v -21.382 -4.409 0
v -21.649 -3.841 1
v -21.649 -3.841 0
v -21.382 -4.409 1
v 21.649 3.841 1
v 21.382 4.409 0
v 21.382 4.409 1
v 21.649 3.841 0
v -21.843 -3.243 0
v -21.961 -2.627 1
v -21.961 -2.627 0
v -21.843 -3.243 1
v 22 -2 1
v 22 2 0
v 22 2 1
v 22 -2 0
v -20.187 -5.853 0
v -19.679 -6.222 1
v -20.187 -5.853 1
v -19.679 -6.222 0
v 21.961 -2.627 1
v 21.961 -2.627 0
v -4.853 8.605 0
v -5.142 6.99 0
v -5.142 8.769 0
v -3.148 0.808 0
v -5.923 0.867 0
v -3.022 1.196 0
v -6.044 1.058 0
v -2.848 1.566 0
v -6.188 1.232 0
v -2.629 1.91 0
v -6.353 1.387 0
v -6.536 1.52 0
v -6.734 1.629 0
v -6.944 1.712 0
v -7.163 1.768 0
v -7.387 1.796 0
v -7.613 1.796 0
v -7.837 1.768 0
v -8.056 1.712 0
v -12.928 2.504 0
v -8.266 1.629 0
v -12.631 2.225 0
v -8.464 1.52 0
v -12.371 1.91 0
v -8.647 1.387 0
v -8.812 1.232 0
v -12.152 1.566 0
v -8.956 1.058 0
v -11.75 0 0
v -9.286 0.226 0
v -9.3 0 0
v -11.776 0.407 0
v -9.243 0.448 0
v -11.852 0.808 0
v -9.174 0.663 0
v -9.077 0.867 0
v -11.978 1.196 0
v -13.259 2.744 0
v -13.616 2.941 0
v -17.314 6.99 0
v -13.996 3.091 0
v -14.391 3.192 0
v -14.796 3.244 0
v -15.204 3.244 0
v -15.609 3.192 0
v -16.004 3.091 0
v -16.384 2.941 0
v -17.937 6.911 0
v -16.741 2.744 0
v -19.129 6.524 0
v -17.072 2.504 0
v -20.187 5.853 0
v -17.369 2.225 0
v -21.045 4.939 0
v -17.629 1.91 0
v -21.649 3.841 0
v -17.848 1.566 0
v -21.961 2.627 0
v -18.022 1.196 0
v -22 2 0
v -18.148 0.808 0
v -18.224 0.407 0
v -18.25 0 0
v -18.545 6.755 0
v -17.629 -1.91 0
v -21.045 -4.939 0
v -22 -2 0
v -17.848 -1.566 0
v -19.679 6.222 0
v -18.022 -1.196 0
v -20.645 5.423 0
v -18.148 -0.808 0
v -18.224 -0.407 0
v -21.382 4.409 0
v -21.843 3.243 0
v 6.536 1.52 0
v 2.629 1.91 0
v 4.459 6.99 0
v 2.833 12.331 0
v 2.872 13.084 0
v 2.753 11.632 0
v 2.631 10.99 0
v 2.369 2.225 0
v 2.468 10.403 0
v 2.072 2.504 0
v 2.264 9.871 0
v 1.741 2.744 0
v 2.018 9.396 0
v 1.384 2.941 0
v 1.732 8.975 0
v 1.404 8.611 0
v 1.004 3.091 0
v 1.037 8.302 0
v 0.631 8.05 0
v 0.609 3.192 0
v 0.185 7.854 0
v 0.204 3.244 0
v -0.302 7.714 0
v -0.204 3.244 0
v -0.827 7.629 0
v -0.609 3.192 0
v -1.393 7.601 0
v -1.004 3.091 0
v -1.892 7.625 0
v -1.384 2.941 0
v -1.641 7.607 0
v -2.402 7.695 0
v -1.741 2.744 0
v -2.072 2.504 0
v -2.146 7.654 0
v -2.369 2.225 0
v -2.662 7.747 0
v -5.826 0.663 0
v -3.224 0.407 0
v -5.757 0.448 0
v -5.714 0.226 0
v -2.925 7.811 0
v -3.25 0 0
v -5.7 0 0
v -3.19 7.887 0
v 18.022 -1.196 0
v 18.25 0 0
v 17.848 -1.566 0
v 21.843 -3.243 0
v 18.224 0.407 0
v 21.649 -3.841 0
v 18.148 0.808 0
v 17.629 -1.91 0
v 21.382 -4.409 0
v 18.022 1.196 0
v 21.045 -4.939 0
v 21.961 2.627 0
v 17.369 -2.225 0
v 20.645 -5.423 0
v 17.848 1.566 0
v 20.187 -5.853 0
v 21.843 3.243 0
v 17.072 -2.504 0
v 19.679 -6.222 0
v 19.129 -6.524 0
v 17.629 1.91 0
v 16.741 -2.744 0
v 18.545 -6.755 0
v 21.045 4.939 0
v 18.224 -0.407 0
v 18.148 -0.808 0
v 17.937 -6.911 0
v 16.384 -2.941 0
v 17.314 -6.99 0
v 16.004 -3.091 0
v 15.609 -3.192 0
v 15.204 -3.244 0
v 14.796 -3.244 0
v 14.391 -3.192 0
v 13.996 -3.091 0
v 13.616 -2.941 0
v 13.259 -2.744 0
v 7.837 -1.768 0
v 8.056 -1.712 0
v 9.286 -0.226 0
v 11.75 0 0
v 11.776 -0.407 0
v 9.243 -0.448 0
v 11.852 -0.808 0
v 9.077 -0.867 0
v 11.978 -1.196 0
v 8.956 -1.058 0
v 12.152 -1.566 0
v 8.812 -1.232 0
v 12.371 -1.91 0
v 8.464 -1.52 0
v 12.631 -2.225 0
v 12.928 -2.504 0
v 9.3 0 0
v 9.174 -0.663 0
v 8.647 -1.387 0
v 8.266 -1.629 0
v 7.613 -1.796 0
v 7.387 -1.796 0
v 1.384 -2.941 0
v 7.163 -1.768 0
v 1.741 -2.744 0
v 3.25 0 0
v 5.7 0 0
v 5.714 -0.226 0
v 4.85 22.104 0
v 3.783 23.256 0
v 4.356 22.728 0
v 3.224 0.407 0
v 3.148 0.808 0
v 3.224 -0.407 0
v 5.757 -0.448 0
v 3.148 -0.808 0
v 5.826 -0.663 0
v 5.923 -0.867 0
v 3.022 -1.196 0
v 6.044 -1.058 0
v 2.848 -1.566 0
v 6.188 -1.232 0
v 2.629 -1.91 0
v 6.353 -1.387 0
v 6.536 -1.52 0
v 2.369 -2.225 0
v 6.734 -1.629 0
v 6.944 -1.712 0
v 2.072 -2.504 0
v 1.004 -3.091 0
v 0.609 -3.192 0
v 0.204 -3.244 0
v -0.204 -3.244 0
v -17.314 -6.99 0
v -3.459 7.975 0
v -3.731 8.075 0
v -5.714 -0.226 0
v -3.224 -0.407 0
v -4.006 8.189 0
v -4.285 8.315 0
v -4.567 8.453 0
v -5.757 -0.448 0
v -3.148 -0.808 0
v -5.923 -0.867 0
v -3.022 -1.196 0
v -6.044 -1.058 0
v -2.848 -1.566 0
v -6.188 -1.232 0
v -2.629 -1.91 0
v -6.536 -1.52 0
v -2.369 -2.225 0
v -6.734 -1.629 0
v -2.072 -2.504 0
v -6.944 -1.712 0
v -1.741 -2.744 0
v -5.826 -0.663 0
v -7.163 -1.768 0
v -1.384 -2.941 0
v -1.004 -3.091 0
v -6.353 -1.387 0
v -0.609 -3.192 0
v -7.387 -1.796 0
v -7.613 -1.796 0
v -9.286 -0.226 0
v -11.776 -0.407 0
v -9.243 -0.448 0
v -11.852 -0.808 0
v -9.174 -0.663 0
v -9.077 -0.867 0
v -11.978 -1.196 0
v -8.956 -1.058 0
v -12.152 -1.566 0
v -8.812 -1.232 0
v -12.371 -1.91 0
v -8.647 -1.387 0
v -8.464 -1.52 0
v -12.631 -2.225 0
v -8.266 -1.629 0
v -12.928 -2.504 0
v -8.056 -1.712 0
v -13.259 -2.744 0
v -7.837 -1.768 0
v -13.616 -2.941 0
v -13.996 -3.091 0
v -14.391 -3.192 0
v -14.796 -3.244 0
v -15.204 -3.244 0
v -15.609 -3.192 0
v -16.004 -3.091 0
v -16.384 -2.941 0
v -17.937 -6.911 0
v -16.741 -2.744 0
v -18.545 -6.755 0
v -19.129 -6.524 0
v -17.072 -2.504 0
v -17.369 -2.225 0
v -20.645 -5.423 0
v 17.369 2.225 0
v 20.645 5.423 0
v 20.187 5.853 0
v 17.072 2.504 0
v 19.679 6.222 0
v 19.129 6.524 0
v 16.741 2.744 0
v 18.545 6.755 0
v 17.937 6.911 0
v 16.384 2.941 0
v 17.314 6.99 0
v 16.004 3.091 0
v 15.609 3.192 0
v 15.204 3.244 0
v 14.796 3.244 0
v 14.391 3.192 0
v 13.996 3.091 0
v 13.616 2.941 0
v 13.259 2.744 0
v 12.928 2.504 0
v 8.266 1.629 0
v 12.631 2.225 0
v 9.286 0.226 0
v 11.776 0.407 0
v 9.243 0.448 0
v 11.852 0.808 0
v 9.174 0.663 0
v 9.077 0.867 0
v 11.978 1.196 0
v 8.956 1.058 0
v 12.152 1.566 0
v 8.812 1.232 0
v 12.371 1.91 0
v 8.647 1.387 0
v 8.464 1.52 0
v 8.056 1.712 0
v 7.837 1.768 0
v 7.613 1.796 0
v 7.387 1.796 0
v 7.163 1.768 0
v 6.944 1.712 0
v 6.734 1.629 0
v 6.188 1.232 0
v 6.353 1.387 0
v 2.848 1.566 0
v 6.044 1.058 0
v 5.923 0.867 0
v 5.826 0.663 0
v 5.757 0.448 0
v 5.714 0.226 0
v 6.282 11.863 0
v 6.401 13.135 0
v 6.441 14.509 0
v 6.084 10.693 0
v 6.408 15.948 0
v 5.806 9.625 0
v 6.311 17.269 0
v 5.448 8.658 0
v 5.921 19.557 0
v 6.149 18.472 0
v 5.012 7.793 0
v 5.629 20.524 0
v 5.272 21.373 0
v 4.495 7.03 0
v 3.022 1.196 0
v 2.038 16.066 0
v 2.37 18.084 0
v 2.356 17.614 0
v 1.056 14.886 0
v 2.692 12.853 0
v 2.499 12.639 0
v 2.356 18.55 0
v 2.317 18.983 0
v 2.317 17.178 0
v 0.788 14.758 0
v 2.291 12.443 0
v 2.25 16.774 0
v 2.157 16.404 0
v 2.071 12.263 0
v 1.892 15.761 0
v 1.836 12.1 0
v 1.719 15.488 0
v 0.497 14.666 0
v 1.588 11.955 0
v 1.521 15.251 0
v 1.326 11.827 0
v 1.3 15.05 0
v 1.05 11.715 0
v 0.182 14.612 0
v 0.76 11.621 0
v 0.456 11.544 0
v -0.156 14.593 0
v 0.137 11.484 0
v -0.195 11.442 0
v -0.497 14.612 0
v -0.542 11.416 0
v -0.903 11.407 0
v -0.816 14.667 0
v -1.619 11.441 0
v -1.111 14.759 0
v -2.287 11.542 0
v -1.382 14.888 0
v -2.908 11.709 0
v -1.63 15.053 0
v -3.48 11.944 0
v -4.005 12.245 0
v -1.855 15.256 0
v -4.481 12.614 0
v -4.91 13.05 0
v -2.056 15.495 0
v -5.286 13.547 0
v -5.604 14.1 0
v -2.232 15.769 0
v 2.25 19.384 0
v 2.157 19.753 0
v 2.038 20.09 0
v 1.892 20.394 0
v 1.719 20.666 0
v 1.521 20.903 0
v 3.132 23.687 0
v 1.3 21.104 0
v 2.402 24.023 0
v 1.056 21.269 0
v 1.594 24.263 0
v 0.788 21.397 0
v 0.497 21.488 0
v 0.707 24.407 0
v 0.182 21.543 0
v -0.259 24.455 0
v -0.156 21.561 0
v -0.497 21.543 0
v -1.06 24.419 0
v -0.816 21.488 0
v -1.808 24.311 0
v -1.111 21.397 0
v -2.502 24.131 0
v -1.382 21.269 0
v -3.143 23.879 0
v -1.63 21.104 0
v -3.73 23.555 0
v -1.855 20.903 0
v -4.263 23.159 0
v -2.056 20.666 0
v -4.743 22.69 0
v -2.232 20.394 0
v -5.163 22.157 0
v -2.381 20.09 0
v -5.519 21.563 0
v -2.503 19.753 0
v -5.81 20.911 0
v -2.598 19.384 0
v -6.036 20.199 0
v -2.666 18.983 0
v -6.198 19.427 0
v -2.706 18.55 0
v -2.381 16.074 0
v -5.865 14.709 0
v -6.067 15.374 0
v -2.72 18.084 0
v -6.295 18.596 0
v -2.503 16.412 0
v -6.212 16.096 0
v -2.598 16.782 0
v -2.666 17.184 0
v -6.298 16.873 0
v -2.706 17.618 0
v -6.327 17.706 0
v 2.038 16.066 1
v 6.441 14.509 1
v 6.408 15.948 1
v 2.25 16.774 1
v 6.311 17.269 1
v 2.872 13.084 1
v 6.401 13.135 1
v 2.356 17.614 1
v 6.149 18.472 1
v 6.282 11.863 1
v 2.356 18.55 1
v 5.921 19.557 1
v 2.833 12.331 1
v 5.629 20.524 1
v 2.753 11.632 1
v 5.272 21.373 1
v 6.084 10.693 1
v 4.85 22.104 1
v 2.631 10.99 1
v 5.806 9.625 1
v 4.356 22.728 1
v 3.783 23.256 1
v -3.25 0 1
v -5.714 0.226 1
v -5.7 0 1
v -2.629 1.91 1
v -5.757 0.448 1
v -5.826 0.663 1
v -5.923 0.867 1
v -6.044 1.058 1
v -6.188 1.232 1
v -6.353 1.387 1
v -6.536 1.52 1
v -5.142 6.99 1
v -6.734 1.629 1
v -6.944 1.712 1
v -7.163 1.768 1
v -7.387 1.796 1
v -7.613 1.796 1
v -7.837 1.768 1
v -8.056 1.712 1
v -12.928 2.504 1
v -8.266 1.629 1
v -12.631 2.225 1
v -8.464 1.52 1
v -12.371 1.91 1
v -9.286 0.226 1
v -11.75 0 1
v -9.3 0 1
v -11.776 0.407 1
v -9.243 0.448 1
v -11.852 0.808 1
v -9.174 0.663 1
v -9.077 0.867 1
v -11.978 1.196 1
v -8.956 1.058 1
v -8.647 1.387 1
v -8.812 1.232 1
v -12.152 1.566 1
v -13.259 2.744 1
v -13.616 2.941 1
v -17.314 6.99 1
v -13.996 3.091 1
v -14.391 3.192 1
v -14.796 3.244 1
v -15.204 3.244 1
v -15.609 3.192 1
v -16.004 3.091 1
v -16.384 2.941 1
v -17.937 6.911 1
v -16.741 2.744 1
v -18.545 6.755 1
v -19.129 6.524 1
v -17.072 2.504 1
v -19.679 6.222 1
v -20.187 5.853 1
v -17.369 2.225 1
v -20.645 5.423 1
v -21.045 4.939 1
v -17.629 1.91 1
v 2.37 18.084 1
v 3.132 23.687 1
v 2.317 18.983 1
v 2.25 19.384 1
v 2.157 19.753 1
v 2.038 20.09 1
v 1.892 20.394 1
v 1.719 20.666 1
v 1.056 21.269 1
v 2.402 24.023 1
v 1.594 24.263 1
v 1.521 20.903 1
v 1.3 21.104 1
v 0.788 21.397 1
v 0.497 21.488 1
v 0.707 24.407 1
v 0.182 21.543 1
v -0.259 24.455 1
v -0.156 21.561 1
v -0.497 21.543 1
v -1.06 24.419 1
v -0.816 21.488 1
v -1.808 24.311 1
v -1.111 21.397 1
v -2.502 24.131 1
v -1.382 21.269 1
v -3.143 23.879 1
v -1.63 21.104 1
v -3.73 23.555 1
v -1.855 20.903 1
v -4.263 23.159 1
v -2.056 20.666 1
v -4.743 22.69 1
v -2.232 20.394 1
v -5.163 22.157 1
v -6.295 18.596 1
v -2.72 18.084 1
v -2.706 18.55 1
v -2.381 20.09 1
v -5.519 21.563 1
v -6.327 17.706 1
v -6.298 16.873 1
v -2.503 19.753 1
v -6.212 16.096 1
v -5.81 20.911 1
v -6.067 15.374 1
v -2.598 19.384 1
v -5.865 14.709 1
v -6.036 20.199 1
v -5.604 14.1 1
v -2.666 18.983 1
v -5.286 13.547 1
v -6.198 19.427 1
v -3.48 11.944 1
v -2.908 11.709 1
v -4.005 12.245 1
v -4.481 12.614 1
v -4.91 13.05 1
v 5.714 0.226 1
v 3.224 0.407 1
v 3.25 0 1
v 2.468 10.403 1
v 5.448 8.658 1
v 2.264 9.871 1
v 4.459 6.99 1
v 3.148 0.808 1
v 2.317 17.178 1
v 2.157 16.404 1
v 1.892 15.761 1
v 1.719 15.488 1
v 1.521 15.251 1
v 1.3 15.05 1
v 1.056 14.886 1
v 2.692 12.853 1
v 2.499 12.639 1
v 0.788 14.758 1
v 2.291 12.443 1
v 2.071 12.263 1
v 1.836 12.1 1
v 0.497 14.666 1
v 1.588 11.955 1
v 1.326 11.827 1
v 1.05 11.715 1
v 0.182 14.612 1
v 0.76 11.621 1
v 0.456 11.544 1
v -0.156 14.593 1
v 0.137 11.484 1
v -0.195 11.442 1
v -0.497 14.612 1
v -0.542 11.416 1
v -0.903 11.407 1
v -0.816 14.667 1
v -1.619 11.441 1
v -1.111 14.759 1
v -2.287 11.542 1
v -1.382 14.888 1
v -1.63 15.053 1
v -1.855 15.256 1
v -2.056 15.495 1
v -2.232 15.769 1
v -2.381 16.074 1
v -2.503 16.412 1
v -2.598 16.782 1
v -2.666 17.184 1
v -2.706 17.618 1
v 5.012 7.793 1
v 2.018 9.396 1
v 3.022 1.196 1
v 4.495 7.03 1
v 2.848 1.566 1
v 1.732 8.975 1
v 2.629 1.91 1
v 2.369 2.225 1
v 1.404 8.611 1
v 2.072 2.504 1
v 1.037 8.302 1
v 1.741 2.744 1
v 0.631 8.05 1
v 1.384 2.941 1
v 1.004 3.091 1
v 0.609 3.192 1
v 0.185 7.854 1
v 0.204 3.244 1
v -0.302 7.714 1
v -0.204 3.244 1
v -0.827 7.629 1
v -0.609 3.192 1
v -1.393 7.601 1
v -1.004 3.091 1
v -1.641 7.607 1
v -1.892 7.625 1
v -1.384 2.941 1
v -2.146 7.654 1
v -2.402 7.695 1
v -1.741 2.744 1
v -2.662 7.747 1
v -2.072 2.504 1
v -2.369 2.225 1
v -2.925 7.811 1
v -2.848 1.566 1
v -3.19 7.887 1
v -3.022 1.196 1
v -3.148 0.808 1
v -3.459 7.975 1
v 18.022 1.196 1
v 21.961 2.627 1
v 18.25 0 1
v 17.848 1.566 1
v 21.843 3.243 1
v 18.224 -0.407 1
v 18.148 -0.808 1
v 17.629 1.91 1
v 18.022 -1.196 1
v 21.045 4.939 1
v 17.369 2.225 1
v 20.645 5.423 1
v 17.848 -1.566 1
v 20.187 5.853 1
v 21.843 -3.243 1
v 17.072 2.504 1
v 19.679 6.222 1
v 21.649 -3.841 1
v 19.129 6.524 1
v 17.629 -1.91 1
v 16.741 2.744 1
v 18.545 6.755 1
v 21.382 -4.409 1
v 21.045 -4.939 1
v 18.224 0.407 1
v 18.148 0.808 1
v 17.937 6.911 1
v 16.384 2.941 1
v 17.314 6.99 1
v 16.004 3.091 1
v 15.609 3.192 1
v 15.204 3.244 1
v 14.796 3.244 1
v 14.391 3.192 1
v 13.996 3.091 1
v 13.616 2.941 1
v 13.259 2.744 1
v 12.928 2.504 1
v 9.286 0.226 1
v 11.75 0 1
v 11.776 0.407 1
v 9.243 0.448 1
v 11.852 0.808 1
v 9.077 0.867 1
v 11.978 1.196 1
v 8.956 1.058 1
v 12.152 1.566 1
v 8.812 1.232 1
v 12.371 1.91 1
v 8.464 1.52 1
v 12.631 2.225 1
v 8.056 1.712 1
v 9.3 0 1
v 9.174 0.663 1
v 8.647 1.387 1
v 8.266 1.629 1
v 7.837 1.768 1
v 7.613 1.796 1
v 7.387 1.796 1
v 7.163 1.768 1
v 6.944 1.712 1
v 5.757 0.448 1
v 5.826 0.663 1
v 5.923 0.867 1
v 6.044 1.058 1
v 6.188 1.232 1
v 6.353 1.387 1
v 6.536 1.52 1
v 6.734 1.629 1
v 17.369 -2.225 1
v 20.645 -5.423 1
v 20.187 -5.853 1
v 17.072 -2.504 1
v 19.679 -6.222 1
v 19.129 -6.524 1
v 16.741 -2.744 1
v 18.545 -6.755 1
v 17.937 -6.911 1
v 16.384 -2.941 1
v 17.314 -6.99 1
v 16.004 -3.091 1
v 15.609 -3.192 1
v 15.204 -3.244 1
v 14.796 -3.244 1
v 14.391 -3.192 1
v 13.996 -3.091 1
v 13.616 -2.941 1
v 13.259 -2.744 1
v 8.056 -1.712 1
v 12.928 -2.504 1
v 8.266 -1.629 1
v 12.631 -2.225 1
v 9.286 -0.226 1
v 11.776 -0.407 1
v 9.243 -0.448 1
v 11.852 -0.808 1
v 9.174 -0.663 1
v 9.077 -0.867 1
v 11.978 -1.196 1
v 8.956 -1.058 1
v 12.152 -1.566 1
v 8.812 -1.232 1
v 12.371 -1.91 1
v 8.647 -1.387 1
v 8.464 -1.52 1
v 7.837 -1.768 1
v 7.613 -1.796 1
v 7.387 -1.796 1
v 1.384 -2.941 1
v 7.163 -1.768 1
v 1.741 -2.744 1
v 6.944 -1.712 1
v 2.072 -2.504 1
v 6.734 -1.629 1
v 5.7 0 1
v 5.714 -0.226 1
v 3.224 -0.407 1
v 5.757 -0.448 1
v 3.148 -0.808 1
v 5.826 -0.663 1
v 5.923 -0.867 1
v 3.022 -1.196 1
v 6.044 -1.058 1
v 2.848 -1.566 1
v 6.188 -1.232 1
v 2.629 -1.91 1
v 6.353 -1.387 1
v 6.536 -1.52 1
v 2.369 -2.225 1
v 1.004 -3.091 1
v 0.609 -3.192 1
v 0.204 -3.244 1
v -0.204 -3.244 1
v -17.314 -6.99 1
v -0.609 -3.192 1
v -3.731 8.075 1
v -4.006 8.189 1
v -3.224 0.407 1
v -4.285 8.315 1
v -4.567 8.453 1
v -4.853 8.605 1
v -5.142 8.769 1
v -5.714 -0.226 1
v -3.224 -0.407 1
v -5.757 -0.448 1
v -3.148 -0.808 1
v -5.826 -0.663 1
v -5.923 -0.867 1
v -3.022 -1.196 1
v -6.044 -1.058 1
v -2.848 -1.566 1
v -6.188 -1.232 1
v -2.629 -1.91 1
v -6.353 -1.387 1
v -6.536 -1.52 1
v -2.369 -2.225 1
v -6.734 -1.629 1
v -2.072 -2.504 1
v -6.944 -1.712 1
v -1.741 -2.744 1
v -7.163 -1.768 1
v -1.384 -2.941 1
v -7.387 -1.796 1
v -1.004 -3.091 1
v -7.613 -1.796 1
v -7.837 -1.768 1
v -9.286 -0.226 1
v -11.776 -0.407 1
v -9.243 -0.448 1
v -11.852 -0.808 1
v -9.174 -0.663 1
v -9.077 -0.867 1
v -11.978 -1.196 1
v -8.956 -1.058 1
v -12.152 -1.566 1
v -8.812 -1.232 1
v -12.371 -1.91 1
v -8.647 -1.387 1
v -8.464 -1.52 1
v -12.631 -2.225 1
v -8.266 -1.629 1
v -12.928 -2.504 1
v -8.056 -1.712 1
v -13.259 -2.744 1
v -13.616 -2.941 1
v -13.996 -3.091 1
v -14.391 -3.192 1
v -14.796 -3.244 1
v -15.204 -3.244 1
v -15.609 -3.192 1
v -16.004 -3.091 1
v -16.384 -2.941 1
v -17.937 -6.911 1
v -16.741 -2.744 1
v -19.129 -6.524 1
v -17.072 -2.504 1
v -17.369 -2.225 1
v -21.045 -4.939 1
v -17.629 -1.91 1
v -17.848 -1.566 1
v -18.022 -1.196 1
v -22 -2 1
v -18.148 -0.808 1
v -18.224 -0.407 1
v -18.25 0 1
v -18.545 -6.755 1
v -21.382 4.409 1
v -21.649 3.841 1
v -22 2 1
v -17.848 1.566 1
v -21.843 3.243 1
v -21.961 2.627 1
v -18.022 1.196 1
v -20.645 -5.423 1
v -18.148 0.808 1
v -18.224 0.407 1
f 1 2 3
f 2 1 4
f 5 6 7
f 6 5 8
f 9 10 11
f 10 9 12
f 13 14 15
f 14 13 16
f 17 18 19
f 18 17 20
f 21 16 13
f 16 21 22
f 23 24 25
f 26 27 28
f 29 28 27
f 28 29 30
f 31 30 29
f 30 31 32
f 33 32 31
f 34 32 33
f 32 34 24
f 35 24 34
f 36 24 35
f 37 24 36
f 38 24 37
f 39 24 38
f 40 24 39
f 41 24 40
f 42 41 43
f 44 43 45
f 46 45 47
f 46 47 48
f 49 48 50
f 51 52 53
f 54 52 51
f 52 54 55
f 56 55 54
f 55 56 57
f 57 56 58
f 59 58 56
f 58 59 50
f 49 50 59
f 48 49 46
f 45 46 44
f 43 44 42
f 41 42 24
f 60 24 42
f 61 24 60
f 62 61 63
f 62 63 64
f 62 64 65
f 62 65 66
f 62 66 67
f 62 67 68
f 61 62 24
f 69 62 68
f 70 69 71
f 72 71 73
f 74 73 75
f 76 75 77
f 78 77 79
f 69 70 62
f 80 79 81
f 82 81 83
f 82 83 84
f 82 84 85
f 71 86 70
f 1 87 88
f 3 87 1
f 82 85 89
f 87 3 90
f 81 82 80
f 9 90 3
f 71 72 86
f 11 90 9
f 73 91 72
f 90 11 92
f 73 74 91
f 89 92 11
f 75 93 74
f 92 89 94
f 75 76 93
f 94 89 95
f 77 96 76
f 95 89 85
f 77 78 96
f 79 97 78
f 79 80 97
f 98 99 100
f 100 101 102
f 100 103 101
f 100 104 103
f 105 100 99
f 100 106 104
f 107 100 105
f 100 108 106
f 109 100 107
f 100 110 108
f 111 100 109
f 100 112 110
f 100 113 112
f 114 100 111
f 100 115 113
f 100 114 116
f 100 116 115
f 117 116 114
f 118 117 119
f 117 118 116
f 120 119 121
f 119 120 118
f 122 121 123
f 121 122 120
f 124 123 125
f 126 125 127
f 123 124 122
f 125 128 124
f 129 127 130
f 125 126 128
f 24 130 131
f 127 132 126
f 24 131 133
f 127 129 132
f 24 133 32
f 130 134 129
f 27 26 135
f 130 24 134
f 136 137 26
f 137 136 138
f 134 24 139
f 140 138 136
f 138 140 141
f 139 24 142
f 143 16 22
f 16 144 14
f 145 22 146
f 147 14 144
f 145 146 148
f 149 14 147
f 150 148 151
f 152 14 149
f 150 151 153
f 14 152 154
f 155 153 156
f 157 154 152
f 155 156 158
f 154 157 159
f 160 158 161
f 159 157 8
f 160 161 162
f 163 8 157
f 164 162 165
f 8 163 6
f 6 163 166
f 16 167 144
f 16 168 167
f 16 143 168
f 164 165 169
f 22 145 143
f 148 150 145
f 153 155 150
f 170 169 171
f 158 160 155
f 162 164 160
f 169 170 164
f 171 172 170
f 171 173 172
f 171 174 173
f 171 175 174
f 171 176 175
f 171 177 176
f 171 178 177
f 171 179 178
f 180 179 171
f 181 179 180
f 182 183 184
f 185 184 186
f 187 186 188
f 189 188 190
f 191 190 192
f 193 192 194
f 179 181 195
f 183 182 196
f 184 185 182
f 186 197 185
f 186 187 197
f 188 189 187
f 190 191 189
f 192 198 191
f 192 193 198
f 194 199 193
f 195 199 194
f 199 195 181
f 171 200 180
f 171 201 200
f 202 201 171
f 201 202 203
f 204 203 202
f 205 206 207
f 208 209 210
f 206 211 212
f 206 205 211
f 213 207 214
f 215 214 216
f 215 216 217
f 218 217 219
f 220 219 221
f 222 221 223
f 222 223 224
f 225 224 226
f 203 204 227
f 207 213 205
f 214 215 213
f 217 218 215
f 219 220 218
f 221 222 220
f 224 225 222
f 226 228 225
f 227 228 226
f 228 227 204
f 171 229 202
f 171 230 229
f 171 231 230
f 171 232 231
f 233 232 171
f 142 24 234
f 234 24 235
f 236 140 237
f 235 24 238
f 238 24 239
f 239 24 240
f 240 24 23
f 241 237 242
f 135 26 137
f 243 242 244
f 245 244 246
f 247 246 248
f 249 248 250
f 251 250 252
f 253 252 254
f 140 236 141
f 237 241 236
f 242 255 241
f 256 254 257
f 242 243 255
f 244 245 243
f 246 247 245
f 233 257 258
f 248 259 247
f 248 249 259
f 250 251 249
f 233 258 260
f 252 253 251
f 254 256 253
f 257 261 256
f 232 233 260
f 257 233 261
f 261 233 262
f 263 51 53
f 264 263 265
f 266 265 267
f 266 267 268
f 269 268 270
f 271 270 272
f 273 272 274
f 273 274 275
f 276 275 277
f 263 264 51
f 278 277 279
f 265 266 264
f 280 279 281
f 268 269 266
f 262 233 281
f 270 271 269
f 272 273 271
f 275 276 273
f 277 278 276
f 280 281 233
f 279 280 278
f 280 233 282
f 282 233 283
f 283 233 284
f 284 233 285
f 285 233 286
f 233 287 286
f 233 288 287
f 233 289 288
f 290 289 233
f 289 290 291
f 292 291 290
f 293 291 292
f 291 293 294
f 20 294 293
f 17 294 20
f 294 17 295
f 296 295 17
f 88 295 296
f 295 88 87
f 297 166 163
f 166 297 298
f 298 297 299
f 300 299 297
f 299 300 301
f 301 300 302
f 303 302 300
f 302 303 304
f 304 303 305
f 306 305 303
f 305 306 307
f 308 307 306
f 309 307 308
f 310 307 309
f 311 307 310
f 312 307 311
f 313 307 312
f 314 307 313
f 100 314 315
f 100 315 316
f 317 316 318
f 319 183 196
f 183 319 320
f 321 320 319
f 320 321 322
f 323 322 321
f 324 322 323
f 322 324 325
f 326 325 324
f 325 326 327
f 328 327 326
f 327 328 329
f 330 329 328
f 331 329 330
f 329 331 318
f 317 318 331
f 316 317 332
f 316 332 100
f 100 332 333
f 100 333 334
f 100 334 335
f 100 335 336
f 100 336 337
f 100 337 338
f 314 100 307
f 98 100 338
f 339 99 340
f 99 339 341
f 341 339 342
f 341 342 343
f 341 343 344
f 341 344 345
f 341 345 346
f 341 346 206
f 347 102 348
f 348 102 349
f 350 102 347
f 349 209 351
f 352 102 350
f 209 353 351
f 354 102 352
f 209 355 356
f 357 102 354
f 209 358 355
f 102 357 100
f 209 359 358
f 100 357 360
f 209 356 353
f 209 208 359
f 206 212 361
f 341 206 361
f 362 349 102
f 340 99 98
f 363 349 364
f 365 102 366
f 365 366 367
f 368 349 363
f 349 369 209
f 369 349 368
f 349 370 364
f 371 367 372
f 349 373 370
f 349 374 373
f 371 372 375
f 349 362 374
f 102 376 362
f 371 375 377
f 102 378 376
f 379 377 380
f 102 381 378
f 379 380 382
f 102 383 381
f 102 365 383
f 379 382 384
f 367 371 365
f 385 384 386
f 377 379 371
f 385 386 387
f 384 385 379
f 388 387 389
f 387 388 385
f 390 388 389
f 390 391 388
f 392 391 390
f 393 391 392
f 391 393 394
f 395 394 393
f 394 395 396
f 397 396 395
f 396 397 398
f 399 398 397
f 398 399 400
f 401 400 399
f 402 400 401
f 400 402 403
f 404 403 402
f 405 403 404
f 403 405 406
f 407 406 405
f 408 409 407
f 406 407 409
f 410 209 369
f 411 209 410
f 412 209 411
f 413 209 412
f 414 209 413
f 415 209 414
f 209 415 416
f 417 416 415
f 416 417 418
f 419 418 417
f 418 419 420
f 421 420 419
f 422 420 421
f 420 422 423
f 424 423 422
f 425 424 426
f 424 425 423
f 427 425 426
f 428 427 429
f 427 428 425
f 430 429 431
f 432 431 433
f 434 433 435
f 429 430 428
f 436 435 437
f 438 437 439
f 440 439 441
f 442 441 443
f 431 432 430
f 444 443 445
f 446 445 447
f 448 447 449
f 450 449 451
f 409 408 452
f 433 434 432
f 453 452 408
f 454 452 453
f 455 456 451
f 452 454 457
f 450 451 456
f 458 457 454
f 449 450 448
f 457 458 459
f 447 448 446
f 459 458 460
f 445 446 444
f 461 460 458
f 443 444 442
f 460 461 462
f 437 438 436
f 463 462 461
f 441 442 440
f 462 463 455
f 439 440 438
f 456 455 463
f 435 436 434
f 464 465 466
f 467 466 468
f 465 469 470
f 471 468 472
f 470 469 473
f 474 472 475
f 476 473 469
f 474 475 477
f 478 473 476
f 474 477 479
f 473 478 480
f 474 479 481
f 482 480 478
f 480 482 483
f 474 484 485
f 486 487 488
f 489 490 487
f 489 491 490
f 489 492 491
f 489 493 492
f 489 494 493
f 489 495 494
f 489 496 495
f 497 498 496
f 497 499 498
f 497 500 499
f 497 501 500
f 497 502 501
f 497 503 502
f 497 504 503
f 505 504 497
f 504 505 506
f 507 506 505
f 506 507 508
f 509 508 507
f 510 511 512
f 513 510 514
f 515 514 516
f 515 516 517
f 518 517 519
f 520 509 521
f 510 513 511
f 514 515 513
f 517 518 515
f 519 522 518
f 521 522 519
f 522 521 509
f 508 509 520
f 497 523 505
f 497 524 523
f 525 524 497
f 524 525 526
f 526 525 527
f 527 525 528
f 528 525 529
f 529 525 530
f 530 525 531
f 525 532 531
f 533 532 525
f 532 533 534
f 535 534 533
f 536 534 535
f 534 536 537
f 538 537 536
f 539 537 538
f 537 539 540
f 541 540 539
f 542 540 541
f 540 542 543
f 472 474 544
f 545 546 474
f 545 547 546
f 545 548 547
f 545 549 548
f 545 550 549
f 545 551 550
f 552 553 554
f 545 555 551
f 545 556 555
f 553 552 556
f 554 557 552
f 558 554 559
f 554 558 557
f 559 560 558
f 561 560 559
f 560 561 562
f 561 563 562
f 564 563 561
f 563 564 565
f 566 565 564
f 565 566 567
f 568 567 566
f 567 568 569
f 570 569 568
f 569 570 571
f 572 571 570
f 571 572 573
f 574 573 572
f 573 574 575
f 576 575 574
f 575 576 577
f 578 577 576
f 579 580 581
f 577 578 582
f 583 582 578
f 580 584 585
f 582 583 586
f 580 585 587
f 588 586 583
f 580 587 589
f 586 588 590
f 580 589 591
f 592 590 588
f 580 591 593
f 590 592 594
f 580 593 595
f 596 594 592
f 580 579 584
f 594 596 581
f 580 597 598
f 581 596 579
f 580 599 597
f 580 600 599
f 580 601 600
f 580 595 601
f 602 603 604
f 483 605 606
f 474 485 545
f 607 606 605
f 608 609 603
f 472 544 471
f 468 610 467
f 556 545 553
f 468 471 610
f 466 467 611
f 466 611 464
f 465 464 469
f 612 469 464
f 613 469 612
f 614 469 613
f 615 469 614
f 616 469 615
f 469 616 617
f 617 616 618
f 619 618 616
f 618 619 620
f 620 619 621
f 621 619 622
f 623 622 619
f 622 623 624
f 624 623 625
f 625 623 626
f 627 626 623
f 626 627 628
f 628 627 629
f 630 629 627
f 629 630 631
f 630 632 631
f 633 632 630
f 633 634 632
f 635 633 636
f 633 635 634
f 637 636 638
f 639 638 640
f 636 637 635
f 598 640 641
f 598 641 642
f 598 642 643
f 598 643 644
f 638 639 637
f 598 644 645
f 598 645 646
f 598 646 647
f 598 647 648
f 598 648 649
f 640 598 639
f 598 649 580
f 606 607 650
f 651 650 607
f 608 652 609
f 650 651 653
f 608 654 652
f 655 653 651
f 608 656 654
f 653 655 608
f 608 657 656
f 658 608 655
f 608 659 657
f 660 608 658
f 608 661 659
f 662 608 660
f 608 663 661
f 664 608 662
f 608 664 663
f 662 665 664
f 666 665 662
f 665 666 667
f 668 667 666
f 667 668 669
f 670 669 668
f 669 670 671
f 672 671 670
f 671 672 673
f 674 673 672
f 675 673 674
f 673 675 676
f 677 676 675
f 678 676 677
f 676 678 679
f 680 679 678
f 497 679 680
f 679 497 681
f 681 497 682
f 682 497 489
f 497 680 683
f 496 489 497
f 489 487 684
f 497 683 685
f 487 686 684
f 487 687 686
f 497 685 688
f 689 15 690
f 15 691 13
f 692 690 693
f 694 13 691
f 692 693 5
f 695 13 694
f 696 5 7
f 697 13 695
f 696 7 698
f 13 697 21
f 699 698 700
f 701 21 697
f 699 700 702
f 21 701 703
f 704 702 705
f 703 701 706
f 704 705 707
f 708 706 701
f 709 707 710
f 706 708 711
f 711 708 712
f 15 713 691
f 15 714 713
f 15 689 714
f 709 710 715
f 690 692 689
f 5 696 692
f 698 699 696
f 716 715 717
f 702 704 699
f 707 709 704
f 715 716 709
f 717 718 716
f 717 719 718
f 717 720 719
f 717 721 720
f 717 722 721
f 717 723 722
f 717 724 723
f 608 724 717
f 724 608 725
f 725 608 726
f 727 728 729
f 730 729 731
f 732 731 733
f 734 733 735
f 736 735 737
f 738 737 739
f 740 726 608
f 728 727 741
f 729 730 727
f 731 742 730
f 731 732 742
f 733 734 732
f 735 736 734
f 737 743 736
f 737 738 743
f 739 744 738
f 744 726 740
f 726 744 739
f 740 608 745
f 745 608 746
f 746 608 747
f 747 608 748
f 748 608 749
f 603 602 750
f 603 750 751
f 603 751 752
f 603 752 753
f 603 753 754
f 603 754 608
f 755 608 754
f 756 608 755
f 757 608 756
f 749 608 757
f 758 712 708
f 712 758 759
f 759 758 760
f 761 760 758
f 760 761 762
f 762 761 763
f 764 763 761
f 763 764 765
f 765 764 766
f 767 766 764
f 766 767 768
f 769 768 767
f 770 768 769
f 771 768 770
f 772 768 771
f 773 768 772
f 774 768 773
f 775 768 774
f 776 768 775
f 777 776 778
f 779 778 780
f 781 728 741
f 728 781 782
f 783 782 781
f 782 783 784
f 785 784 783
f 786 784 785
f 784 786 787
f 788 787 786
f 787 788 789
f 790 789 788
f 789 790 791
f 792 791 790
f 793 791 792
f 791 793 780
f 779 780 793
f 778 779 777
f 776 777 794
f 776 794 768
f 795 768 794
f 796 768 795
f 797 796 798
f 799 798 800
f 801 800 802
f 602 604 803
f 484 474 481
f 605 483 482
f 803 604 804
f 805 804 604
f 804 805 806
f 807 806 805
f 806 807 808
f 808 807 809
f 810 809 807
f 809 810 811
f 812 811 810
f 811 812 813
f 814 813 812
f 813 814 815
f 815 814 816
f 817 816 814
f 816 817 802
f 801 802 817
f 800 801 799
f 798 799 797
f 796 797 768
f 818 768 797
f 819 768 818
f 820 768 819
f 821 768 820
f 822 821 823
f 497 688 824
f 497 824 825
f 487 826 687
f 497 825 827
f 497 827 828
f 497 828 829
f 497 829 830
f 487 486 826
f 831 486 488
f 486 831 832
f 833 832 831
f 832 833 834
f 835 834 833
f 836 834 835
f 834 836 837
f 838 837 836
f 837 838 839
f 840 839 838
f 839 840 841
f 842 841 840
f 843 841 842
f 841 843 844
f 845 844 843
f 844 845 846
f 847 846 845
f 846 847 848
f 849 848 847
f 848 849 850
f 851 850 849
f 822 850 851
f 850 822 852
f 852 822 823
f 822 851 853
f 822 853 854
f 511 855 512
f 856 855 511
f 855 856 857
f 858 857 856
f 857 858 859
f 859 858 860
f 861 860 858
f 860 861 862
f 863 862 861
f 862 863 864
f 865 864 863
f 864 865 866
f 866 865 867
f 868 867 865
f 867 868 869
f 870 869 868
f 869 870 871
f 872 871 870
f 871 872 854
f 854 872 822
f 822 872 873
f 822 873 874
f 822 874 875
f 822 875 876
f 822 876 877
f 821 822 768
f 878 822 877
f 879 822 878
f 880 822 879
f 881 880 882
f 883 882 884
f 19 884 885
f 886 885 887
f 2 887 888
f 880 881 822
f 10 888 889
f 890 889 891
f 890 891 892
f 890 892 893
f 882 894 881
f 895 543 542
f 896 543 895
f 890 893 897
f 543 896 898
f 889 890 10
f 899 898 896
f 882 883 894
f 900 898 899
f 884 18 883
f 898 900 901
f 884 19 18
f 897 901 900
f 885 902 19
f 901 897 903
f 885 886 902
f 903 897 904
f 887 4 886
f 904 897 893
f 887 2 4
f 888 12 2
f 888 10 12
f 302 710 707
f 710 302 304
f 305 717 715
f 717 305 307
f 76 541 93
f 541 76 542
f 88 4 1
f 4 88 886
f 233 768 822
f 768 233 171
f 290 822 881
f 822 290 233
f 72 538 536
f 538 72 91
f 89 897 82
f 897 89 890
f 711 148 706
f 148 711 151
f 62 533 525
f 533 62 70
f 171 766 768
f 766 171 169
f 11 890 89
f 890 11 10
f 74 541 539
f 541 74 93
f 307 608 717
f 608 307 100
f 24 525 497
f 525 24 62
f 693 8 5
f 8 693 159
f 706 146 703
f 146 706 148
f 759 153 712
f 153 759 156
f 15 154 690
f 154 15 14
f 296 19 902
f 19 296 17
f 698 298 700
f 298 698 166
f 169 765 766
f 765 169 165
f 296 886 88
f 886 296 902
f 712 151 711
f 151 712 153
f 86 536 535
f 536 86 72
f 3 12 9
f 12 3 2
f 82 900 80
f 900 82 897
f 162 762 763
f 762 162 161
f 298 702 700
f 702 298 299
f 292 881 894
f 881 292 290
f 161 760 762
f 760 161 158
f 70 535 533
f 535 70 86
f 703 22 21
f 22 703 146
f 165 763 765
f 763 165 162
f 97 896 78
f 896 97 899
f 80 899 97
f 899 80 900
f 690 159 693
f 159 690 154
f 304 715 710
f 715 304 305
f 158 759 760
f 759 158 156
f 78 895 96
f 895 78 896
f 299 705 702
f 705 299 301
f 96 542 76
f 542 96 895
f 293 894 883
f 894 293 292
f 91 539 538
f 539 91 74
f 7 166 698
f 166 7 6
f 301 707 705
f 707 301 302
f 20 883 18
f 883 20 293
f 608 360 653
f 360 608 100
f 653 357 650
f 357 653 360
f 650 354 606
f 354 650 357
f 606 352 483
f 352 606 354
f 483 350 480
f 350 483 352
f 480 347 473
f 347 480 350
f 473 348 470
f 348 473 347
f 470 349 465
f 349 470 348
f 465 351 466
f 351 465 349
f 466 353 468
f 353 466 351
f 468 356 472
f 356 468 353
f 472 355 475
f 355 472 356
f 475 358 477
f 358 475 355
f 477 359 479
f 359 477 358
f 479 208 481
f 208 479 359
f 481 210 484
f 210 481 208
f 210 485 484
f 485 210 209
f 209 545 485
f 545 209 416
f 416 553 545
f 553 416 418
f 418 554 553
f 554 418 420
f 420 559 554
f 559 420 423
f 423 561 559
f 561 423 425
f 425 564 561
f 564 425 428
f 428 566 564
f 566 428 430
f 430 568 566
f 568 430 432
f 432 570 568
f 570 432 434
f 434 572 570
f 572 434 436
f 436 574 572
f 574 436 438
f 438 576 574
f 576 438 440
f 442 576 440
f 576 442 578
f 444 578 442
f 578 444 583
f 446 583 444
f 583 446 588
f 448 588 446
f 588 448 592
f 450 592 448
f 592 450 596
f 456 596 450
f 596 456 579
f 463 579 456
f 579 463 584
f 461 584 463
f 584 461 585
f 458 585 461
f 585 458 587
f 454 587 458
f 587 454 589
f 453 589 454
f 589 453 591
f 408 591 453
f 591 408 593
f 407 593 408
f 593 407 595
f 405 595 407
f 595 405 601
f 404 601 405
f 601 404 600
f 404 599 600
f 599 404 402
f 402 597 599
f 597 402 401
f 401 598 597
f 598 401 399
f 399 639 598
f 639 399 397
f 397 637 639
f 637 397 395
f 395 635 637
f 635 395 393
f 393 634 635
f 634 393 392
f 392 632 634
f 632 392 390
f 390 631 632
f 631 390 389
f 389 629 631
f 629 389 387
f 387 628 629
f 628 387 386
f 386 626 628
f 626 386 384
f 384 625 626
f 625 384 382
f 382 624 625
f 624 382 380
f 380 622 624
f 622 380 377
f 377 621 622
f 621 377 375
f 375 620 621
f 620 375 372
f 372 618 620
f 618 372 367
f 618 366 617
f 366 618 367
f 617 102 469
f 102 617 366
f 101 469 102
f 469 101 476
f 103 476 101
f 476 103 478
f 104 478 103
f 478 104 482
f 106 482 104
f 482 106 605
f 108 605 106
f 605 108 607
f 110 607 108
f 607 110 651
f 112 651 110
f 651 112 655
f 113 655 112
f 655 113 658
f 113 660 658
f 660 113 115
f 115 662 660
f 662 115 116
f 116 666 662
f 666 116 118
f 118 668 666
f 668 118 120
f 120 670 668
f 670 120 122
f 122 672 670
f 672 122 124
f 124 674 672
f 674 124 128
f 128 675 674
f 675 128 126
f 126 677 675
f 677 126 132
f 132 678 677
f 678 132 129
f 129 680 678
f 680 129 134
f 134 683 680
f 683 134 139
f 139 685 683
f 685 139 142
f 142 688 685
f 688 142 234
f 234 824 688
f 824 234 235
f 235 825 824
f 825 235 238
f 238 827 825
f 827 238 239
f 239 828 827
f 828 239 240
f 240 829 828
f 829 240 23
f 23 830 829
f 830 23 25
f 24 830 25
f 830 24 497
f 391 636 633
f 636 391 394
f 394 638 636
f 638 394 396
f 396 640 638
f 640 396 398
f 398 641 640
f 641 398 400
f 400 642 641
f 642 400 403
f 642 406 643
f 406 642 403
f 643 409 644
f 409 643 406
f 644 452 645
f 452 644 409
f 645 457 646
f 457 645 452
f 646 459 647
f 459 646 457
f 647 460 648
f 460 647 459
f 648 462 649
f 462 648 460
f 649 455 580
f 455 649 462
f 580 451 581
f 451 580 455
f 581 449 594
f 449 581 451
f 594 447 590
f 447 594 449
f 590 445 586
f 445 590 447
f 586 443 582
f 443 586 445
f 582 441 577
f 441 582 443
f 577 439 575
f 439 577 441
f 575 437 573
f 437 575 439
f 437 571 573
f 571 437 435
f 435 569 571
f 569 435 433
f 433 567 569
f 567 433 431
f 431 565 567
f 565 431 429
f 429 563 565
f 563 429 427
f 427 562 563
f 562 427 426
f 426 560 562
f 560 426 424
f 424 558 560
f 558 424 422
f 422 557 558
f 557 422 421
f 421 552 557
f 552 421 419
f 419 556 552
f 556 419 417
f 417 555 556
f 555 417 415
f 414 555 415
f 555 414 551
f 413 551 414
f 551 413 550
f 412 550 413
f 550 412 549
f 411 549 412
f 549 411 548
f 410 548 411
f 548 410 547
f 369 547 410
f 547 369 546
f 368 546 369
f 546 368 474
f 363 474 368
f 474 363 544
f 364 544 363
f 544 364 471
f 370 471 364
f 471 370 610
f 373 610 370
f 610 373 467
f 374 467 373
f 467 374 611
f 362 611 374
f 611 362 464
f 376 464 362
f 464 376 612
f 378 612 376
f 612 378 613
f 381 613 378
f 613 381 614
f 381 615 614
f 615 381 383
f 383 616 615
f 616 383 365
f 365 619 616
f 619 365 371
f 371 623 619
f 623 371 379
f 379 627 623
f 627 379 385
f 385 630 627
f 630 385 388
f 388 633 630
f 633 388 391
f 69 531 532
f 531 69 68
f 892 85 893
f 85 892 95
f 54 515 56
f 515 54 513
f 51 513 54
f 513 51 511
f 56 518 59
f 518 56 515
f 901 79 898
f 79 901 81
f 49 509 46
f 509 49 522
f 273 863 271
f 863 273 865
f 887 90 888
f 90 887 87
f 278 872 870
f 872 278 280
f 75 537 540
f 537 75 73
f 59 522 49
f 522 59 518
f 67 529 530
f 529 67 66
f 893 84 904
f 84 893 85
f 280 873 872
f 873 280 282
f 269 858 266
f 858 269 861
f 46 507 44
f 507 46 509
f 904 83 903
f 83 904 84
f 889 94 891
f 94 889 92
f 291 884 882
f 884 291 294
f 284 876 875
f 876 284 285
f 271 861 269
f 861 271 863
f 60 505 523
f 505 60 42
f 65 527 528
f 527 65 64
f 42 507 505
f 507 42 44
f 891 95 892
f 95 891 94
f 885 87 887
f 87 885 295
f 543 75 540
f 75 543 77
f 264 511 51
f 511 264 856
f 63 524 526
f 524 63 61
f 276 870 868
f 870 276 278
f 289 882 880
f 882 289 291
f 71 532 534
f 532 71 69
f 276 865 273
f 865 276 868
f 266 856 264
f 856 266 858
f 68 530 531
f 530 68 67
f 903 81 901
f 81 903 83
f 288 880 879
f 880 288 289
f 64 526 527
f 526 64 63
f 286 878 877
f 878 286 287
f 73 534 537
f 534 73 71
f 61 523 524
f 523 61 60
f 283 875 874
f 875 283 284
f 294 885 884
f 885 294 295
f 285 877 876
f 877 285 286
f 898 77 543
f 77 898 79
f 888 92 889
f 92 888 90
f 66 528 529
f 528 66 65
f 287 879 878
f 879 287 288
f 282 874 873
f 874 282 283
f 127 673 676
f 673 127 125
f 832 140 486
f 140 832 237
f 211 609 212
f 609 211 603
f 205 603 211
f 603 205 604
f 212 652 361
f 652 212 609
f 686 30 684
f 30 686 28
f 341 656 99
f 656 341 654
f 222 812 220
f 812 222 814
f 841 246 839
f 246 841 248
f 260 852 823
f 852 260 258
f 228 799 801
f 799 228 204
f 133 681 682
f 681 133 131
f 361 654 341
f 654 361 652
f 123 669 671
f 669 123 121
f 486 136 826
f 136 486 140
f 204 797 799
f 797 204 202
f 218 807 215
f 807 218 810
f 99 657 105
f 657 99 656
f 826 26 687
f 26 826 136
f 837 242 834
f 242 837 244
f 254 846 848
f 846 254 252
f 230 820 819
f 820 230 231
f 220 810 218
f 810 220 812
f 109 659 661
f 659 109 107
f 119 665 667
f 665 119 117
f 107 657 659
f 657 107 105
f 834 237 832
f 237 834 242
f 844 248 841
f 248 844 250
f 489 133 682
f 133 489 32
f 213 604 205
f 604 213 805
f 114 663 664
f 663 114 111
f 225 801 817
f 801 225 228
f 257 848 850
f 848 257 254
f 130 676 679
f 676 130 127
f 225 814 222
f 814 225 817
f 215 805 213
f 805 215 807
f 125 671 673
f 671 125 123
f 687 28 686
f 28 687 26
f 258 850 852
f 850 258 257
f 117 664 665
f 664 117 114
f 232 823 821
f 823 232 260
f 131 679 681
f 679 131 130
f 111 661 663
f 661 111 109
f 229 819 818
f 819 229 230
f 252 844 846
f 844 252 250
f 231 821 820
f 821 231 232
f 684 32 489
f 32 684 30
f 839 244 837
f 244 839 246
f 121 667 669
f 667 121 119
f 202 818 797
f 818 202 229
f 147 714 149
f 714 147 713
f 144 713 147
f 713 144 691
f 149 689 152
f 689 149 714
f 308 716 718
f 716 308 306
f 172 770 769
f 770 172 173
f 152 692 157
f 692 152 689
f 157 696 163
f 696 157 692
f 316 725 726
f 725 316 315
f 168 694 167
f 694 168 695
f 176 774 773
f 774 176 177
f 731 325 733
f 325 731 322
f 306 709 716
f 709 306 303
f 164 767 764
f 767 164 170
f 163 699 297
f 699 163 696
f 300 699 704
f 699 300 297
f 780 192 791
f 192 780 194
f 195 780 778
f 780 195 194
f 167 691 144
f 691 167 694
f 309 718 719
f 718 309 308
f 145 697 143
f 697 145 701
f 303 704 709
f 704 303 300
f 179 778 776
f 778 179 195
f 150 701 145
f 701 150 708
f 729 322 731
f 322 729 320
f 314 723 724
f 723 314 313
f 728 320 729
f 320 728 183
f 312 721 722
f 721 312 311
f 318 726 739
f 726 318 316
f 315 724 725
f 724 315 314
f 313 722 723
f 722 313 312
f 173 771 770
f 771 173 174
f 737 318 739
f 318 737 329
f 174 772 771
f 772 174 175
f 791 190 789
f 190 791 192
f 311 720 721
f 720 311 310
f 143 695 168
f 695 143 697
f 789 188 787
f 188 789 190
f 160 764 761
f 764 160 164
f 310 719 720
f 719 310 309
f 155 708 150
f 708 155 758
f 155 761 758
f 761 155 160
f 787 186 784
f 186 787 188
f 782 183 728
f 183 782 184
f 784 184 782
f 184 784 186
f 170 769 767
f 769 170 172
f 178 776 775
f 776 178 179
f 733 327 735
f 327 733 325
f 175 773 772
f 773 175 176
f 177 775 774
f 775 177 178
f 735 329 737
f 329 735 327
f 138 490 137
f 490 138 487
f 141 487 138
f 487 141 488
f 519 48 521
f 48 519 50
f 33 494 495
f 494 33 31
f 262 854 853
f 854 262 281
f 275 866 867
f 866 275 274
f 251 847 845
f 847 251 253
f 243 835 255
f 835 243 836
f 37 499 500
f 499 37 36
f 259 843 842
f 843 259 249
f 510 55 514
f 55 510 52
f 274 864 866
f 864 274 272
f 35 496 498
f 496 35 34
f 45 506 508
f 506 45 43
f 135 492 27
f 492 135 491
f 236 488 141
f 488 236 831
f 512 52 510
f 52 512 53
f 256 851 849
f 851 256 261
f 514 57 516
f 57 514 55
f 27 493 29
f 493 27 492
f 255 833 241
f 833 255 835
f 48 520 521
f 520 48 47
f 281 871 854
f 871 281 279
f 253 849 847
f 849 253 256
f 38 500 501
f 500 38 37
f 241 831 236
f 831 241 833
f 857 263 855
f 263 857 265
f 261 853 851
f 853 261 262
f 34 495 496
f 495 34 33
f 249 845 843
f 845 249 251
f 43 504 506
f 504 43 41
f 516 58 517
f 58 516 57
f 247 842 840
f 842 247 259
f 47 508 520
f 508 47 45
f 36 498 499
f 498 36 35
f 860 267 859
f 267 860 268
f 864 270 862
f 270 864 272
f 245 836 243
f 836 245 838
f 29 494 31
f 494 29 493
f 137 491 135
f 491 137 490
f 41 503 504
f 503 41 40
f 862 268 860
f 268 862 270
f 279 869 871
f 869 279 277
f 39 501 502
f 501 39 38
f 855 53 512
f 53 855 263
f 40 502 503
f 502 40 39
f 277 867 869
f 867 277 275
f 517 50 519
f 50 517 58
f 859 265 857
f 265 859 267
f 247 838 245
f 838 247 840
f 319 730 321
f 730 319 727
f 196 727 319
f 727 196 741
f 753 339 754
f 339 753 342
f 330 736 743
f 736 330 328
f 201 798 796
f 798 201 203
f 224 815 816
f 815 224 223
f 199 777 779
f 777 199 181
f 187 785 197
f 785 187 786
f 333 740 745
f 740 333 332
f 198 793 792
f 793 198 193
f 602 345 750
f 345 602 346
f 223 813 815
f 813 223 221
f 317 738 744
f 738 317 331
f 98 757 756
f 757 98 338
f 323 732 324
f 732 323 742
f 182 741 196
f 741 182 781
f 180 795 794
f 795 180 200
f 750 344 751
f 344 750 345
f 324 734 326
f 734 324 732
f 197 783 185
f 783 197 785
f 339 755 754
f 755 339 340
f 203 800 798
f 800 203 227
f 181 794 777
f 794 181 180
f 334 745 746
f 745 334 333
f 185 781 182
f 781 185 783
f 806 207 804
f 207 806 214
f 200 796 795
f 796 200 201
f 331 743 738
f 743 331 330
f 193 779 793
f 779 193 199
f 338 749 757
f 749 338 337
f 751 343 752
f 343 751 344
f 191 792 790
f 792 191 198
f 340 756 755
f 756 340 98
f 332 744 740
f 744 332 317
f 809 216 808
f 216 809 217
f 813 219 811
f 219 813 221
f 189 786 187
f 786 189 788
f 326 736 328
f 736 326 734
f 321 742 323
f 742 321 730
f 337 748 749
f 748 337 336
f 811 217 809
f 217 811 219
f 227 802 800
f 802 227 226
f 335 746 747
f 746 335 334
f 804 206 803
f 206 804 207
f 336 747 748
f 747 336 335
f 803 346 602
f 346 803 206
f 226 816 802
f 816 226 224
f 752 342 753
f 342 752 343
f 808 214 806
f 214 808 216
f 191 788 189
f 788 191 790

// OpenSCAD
$fn = 50;


difference() {
	union() {
		hull() {
			translate(v = [-17.0000000000, 2.0000000000, 0]) {
				cylinder(h = 1, r = 5);
			}
			translate(v = [17.0000000000, 2.0000000000, 0]) {
				cylinder(h = 1, r = 5);
			}
			translate(v = [-17.0000000000, -2.0000000000, 0]) {
				cylinder(h = 1, r = 5);
			}
			translate(v = [17.0000000000, -2.0000000000, 0]) {
				cylinder(h = 1, r = 5);
			}
		}
		translate(v = [0, 24, 0]) {
			linear_extrude(height = 1) {
				text(font = "DejaVu Sans Mono:style=Bold", halign = "center", size = 19.0000000000, text = "9", valign = "top");
			}
		}
	}
	union() {
		translate(v = [-15.0000000000, 0.0000000000, 0]) {
			translate(v = [0, 0, -100]) {
				cylinder(h = 200, r = 3.2500000000);
			}
		}
		translate(v = [0, 0, -100]) {
			cylinder(h = 200, r = 3.2500000000);
		}
		translate(v = [15.0000000000, 0.0000000000, 0]) {
			translate(v = [0, 0, -100]) {
				cylinder(h = 200, r = 3.2500000000);
			}
		}
		translate(v = [-15.0000000000, 0.0000000000, 0]) {
			translate(v = [0, 0, -100]) {
				cylinder(h = 200, r = 1.8000000000);
			}
		}
		translate(v = [-7.5000000000, 0.0000000000, 0]) {
			translate(v = [0, 0, -100]) {
				cylinder(h = 200, r = 1.8000000000);
			}
		}
		translate(v = [0, 0, -100]) {
			cylinder(h = 200, r = 1.8000000000);
		}
		translate(v = [7.5000000000, 0.0000000000, 0]) {
			translate(v = [0, 0, -100]) {
				cylinder(h = 200, r = 1.8000000000);
			}
		}
		translate(v = [15.0000000000, 0.0000000000, 0]) {
			translate(v = [0, 0, -100]) {
				cylinder(h = 200, r = 1.8000000000);
			}
		}
	}
}
